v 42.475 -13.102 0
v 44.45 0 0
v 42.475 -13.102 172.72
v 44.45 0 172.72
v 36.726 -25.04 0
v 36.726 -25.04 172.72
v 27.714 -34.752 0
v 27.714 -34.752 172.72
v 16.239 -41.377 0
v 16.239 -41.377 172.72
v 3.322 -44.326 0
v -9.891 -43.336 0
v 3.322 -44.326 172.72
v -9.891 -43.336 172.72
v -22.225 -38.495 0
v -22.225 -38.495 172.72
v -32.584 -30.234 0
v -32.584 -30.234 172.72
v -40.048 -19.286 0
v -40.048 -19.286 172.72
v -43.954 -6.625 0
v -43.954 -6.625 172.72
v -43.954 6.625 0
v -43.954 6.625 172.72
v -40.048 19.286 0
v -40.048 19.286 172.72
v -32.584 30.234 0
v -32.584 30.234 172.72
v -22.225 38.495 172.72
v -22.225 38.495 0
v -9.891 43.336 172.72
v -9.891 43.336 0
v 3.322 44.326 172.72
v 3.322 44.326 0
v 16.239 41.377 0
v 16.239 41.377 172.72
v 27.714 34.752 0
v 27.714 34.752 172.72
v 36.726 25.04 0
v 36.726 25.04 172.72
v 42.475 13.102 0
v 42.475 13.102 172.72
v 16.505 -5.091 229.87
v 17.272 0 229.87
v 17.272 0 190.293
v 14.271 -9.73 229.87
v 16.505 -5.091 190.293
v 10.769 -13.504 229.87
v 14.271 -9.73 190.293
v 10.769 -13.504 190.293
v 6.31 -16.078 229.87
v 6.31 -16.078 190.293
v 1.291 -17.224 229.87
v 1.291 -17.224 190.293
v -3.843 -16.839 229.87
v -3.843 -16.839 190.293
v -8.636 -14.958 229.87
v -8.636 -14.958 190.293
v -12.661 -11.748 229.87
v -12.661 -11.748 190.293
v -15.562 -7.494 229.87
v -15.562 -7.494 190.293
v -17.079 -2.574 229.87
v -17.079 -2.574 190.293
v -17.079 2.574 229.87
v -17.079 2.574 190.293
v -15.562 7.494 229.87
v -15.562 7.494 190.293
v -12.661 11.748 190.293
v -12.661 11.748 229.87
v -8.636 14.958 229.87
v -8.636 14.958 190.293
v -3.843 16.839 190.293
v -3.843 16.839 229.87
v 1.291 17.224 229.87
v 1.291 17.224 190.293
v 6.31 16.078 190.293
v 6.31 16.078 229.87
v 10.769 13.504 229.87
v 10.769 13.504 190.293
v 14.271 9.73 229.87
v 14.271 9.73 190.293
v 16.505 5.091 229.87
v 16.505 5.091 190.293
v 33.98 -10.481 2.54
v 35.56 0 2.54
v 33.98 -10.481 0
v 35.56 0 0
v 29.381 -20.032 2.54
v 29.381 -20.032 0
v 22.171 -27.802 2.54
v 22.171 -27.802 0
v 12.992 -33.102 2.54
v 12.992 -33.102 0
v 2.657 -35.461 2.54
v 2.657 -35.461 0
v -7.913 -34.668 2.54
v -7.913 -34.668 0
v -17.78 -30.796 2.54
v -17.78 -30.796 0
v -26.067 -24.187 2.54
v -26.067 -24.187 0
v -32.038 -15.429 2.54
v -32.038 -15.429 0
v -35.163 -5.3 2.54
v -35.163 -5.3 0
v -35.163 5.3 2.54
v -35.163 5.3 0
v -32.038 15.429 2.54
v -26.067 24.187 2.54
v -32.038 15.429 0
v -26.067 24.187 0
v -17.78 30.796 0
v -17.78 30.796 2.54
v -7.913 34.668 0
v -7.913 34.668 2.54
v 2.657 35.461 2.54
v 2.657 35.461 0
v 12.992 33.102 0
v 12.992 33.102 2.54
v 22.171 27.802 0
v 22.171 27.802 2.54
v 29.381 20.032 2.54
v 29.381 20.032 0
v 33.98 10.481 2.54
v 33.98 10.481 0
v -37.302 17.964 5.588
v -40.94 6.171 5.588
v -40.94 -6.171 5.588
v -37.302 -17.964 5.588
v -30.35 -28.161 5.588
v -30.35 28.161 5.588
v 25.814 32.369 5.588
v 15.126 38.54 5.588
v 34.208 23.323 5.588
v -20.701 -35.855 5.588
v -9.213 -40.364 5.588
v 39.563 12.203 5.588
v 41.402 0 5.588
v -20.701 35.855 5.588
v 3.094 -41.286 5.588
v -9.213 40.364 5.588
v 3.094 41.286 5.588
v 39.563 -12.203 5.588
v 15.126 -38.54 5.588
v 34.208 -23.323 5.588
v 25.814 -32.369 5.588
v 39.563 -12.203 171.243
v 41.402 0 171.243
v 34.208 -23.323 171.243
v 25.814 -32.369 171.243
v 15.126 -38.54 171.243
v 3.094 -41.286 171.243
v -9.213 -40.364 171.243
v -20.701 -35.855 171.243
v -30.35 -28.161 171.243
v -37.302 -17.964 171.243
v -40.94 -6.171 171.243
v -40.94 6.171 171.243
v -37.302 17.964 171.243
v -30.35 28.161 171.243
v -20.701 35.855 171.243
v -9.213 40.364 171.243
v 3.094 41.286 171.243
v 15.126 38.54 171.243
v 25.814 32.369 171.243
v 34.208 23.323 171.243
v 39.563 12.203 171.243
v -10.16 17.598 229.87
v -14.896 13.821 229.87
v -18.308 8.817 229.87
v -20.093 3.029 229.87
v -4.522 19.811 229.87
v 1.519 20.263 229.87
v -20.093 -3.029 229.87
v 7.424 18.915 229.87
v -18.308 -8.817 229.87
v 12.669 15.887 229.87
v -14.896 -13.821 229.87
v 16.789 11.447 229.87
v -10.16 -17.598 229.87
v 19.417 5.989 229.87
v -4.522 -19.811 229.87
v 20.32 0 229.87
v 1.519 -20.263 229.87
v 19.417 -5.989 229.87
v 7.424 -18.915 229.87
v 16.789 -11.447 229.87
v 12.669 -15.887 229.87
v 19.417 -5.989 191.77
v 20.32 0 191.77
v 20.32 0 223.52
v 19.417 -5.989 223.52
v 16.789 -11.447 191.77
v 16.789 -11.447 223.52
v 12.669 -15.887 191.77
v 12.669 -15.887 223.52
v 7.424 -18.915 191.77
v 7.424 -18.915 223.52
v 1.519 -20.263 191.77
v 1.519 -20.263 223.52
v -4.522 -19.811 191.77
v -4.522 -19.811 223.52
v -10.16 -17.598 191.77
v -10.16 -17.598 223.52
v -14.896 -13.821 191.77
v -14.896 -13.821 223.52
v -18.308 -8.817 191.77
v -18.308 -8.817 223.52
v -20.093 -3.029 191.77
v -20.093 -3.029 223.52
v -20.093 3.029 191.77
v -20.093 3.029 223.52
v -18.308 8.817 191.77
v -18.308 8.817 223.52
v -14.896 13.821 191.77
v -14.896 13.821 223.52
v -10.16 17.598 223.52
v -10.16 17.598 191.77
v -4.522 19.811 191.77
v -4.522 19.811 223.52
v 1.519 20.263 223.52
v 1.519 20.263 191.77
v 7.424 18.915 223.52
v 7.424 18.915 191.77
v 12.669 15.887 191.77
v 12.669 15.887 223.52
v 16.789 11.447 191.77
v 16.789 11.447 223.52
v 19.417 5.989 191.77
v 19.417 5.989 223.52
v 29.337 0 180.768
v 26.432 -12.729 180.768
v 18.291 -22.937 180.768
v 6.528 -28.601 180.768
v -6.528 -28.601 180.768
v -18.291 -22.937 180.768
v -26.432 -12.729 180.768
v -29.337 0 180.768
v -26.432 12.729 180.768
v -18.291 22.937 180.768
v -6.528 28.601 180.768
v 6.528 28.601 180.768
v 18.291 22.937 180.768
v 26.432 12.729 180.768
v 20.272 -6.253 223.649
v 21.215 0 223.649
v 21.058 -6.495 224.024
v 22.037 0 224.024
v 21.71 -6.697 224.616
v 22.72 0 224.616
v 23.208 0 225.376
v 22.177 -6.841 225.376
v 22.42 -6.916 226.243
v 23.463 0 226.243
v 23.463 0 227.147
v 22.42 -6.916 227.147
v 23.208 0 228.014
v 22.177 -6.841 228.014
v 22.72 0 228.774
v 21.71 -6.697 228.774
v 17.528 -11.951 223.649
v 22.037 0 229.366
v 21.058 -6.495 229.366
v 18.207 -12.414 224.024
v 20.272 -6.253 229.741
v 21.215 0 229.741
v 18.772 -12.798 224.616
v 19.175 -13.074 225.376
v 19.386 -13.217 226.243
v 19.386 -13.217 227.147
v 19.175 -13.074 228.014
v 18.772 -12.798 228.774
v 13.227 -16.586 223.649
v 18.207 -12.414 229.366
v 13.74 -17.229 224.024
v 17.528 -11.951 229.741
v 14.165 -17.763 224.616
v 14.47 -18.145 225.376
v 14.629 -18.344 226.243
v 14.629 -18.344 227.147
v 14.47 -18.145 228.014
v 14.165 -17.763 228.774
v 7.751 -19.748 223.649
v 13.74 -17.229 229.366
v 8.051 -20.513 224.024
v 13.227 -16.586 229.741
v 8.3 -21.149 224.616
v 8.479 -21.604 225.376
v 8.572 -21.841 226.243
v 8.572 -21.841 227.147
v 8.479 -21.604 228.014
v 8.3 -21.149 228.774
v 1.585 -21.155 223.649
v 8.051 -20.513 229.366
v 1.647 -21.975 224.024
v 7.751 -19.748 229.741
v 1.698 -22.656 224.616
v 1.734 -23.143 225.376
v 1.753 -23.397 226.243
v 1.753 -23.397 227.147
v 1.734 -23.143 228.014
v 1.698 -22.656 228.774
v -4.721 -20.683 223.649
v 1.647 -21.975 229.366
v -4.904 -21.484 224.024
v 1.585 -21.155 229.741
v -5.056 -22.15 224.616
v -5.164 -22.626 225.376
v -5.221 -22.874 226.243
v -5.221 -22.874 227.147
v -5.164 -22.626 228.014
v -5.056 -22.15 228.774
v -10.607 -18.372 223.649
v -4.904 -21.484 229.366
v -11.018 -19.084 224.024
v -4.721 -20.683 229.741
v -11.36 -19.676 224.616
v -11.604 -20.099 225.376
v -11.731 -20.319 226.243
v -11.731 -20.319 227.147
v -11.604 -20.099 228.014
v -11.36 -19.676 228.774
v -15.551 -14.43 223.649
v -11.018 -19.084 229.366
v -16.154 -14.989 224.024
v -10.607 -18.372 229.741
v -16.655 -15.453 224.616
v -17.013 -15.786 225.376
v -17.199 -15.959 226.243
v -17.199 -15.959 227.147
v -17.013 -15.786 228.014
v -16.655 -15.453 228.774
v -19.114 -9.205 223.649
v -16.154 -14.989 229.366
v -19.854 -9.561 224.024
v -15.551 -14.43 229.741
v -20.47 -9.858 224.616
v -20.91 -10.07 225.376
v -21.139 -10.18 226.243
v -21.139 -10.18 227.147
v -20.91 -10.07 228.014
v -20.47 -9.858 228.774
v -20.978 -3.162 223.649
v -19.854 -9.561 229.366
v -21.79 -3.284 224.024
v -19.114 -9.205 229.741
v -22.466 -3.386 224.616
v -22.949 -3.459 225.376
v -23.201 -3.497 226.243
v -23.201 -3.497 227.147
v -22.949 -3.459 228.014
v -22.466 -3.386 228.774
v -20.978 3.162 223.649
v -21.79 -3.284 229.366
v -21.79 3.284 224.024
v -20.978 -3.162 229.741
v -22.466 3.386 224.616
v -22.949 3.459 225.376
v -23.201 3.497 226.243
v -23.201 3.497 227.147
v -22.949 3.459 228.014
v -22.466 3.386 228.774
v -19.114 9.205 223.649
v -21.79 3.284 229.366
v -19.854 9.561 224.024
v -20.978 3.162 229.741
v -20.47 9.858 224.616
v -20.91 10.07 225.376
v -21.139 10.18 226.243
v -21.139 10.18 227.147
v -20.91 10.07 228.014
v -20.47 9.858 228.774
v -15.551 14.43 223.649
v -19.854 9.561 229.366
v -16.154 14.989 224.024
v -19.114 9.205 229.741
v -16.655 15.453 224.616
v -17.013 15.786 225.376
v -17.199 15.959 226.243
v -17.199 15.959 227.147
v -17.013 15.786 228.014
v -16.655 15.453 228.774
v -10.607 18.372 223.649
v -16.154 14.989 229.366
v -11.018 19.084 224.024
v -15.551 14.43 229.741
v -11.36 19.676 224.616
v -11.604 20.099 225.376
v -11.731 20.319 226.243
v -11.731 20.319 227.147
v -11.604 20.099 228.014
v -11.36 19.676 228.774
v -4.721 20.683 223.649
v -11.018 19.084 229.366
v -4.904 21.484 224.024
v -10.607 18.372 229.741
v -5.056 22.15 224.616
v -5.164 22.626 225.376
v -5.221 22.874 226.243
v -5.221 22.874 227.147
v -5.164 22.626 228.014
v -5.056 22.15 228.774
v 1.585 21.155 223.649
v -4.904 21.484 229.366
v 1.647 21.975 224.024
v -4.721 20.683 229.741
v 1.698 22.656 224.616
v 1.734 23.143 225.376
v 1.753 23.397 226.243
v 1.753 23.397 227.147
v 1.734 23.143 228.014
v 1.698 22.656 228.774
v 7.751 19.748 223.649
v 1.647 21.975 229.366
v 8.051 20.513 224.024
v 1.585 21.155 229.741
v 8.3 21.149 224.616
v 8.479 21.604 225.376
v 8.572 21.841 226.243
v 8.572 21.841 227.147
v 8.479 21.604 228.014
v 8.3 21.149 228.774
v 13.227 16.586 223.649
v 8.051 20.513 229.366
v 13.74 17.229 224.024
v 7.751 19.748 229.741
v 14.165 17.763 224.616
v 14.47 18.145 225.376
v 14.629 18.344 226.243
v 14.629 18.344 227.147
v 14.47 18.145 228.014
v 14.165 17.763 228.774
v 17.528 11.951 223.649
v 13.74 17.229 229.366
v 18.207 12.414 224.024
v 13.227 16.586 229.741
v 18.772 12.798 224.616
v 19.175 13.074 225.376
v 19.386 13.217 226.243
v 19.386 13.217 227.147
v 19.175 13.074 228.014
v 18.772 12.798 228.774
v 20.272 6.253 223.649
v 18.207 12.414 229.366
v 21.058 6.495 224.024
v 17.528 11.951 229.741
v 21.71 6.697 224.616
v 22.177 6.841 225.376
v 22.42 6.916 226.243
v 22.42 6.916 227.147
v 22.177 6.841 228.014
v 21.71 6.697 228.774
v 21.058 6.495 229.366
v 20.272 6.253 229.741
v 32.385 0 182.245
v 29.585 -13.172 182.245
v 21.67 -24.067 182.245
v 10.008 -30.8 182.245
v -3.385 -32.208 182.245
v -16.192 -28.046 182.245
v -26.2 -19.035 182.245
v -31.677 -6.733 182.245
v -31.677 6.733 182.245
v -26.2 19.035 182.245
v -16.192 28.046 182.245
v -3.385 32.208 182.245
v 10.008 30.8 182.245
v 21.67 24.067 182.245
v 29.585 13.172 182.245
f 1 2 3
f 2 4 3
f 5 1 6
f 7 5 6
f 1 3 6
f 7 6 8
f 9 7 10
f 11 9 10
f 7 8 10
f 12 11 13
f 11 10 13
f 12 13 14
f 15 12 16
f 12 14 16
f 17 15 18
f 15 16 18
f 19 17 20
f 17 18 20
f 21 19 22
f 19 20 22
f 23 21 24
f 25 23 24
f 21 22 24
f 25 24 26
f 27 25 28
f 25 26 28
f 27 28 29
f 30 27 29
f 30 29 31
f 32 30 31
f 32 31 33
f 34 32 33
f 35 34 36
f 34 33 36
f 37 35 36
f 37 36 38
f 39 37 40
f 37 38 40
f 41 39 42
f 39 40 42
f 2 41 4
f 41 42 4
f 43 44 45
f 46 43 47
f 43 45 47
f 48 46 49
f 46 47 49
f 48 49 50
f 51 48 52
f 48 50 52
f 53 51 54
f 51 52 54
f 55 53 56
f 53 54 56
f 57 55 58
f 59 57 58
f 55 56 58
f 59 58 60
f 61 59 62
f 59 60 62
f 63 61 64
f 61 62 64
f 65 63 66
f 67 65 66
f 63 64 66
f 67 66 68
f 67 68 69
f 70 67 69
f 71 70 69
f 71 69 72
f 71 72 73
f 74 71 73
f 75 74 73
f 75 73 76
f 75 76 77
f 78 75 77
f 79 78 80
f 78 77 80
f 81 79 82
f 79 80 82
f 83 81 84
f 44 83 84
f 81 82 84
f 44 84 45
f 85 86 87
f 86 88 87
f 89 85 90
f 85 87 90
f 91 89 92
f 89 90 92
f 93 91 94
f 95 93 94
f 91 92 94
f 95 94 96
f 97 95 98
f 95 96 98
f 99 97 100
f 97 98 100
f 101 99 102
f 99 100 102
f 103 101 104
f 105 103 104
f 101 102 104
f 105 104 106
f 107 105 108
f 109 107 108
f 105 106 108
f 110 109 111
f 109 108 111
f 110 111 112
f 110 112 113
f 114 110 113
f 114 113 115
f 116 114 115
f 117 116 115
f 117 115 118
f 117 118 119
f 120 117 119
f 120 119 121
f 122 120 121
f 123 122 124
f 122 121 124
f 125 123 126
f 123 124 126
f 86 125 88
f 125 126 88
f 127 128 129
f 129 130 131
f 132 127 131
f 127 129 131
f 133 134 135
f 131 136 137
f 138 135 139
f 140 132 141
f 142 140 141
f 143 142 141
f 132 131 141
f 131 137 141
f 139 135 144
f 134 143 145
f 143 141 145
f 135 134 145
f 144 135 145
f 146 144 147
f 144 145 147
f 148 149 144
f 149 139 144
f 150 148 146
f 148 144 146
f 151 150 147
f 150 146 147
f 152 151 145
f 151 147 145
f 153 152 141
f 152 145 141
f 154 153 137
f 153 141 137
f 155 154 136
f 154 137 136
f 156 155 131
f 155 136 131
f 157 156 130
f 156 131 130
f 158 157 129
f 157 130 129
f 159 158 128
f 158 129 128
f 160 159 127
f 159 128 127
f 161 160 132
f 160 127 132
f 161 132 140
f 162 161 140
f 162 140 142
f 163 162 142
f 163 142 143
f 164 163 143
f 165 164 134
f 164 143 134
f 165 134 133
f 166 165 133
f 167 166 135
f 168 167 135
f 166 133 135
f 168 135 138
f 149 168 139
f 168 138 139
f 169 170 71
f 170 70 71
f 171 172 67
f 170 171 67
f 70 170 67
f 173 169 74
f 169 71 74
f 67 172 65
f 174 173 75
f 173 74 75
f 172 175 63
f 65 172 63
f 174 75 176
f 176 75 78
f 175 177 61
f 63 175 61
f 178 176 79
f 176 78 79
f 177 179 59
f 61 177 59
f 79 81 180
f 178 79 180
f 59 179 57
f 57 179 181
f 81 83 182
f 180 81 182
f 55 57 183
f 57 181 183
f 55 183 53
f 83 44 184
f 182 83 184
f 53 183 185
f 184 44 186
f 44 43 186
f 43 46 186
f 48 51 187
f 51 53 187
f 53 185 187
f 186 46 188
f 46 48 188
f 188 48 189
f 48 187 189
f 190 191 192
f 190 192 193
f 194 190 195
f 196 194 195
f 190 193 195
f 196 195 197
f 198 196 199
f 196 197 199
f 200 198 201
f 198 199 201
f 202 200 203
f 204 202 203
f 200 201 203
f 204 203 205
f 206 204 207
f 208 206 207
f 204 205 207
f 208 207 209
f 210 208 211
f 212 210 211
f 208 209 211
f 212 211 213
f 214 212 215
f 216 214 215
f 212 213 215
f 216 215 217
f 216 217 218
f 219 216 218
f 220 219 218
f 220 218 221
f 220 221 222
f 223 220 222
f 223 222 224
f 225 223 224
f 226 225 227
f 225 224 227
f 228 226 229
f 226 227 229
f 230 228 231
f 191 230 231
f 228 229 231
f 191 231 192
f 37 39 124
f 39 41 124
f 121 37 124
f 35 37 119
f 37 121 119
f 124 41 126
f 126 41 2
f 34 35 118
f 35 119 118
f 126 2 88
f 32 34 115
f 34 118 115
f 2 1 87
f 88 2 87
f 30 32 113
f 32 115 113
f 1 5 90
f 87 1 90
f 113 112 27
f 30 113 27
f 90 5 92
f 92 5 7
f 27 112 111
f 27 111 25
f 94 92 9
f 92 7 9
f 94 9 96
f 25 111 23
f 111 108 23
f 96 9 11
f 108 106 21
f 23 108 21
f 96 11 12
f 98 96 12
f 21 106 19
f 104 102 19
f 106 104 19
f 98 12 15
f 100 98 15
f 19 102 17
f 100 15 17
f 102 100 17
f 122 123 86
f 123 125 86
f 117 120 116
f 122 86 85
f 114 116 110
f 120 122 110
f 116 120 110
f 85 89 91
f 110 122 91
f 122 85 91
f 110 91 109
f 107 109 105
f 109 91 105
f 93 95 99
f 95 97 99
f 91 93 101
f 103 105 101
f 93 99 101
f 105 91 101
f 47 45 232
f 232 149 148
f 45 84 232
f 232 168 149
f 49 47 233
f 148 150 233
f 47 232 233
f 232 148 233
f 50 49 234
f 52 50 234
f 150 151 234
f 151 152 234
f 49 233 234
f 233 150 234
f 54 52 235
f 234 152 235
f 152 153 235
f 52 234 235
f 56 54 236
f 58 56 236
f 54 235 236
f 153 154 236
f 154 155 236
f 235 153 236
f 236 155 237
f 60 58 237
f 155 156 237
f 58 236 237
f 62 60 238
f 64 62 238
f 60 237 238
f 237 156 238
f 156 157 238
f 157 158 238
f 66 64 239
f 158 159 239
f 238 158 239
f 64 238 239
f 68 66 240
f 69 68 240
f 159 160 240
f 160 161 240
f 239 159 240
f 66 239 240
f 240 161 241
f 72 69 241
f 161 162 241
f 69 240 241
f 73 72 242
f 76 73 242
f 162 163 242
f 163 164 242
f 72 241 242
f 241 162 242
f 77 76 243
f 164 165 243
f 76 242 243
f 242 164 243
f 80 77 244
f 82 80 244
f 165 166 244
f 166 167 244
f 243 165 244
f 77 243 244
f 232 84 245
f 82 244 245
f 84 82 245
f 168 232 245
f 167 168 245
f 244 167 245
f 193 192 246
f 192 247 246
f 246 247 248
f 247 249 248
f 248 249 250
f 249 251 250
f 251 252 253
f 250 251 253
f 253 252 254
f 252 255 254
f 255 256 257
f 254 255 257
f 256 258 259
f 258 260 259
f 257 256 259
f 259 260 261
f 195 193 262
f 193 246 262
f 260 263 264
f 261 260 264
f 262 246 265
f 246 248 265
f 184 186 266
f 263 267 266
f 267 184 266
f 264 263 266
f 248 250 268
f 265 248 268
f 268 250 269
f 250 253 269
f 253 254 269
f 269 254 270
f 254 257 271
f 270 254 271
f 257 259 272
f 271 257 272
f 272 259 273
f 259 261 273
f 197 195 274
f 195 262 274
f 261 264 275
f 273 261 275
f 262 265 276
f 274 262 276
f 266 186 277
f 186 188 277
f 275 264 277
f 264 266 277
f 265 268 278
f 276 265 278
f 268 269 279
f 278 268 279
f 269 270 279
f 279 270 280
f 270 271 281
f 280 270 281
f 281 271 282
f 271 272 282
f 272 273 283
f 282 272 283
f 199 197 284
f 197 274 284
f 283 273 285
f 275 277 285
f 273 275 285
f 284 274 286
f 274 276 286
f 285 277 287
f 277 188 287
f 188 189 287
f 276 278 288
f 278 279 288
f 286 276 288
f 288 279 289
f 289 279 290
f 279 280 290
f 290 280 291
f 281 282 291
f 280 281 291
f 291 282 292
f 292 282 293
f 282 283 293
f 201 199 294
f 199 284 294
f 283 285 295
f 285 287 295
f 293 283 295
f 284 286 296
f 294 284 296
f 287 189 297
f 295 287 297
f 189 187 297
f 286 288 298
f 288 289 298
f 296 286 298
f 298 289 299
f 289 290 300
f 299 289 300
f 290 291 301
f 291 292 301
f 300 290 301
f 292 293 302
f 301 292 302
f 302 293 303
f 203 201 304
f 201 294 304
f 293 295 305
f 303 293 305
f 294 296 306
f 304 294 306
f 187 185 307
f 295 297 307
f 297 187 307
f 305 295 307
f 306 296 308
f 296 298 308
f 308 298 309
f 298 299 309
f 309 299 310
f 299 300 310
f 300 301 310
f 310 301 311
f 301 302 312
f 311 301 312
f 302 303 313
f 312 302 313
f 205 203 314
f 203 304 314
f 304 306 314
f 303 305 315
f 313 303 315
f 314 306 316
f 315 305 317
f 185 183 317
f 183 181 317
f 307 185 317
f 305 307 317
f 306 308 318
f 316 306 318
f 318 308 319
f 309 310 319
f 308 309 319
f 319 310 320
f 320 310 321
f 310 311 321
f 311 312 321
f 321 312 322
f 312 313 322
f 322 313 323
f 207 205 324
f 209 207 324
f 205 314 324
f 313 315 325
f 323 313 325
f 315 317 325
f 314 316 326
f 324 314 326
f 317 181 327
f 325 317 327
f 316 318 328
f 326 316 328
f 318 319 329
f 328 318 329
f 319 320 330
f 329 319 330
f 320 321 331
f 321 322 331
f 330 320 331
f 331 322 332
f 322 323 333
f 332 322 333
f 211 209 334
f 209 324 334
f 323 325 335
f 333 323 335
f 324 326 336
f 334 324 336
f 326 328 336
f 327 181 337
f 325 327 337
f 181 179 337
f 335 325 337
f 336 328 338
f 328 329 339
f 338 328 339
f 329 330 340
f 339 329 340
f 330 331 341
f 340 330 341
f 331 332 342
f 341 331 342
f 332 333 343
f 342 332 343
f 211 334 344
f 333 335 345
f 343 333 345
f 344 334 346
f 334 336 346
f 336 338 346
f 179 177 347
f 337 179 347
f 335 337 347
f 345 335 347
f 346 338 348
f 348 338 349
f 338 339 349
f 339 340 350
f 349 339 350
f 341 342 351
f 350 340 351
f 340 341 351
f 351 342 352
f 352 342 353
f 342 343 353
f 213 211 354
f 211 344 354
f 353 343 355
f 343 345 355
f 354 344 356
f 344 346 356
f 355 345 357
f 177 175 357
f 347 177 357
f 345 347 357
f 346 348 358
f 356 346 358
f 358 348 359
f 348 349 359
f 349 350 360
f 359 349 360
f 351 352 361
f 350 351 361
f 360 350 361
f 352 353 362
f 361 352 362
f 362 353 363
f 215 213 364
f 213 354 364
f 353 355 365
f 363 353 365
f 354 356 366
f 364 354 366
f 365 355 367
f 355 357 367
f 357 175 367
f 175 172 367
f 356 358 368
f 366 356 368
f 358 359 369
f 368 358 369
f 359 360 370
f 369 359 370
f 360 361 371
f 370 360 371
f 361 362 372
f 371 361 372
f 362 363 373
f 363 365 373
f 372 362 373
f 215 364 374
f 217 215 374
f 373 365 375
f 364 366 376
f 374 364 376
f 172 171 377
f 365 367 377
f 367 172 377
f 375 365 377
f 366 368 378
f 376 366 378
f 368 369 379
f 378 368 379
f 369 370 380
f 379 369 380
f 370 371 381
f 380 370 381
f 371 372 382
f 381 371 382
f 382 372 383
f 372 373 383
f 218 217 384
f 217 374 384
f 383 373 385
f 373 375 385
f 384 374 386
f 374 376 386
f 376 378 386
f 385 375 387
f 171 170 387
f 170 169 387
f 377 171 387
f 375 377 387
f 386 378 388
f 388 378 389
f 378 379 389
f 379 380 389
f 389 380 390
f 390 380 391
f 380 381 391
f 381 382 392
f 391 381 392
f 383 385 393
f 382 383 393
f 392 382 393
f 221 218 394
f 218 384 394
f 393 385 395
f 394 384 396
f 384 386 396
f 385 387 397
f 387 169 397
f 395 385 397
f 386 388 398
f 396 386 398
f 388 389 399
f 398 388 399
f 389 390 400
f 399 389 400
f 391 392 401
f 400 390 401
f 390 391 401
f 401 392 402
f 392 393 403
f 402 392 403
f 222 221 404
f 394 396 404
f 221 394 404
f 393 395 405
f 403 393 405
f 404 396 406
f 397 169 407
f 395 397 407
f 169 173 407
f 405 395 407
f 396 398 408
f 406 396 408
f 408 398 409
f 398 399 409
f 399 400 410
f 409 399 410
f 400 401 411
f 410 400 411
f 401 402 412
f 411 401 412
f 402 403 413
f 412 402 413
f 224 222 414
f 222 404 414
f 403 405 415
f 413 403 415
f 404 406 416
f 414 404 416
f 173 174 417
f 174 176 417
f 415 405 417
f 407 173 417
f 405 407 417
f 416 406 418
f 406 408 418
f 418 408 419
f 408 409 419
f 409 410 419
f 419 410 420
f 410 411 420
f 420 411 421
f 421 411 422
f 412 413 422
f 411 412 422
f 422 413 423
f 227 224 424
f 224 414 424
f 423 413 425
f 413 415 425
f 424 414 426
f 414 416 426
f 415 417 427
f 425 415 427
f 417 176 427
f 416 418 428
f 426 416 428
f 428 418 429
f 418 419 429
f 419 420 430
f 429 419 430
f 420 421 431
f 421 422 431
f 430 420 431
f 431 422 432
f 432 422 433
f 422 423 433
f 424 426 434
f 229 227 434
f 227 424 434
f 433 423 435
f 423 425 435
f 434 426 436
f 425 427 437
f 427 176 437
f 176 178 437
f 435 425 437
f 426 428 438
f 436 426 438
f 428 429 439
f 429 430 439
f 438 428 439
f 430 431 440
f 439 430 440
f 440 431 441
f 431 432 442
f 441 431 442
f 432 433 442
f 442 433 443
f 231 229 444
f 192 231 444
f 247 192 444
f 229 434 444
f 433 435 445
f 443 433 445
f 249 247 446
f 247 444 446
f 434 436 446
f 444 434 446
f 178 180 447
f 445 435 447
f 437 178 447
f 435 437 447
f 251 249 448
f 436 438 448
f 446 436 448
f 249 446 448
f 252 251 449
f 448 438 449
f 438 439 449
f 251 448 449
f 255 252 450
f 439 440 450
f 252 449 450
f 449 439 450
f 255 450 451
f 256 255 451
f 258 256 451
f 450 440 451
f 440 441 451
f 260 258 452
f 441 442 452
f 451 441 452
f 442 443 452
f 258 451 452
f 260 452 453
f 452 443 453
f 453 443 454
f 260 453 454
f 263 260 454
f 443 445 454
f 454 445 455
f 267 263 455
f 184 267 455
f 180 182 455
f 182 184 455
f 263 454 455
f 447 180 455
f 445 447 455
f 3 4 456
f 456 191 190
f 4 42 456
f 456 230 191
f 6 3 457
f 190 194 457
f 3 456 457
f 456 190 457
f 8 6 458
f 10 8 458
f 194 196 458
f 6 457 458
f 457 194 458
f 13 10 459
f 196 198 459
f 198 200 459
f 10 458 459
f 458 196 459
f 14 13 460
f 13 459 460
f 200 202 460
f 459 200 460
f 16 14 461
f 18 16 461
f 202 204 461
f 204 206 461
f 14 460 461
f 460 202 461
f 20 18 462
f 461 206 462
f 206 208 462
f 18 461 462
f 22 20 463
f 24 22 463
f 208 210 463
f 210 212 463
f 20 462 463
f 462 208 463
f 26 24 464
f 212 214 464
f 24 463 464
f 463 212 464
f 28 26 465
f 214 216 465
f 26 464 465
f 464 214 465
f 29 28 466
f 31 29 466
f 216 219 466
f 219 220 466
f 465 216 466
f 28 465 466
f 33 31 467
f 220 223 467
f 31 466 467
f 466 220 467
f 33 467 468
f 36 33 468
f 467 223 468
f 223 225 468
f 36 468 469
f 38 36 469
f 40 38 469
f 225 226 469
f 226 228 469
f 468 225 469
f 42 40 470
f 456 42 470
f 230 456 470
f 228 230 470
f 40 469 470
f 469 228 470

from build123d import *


with BuildPart() as f1:
    # F0 (on Front) → F1 (revolve)
    with BuildSketch(Plane.XZ):
        with BuildLine():
            Line((35.56, 0), (44.45, 0))
            Line((44.45, 0), (44.45, 172.72))
            Line((44.45, 172.72), (20.32, 191.77))
            Line((20.32, 191.77), (20.32, 223.52))
            ThreePointArc((20.32, 223.52), (23.495, 226.695), (20.32, 229.87))
            Line((20.32, 229.87), (17.272, 229.87))
            Line((17.272, 229.87), (17.272, 226.822))
            Line((17.272, 226.822), (17.272, 190.292933))
            Line((17.272, 190.292933), (41.402, 171.242933))
            Line((41.402, 171.242933), (41.402, 5.588))
            Line((41.402, 5.588), (0, 5.588))
            Line((0, 5.588), (0, 2.54))
            Line((0, 2.54), (35.56, 2.54))
            Line((35.56, 2.54), (35.56, 0))
        make_face()
    revolve(axis=Axis((0, 0, 114.935), (0, 0, -1)))


solid = f1.part
